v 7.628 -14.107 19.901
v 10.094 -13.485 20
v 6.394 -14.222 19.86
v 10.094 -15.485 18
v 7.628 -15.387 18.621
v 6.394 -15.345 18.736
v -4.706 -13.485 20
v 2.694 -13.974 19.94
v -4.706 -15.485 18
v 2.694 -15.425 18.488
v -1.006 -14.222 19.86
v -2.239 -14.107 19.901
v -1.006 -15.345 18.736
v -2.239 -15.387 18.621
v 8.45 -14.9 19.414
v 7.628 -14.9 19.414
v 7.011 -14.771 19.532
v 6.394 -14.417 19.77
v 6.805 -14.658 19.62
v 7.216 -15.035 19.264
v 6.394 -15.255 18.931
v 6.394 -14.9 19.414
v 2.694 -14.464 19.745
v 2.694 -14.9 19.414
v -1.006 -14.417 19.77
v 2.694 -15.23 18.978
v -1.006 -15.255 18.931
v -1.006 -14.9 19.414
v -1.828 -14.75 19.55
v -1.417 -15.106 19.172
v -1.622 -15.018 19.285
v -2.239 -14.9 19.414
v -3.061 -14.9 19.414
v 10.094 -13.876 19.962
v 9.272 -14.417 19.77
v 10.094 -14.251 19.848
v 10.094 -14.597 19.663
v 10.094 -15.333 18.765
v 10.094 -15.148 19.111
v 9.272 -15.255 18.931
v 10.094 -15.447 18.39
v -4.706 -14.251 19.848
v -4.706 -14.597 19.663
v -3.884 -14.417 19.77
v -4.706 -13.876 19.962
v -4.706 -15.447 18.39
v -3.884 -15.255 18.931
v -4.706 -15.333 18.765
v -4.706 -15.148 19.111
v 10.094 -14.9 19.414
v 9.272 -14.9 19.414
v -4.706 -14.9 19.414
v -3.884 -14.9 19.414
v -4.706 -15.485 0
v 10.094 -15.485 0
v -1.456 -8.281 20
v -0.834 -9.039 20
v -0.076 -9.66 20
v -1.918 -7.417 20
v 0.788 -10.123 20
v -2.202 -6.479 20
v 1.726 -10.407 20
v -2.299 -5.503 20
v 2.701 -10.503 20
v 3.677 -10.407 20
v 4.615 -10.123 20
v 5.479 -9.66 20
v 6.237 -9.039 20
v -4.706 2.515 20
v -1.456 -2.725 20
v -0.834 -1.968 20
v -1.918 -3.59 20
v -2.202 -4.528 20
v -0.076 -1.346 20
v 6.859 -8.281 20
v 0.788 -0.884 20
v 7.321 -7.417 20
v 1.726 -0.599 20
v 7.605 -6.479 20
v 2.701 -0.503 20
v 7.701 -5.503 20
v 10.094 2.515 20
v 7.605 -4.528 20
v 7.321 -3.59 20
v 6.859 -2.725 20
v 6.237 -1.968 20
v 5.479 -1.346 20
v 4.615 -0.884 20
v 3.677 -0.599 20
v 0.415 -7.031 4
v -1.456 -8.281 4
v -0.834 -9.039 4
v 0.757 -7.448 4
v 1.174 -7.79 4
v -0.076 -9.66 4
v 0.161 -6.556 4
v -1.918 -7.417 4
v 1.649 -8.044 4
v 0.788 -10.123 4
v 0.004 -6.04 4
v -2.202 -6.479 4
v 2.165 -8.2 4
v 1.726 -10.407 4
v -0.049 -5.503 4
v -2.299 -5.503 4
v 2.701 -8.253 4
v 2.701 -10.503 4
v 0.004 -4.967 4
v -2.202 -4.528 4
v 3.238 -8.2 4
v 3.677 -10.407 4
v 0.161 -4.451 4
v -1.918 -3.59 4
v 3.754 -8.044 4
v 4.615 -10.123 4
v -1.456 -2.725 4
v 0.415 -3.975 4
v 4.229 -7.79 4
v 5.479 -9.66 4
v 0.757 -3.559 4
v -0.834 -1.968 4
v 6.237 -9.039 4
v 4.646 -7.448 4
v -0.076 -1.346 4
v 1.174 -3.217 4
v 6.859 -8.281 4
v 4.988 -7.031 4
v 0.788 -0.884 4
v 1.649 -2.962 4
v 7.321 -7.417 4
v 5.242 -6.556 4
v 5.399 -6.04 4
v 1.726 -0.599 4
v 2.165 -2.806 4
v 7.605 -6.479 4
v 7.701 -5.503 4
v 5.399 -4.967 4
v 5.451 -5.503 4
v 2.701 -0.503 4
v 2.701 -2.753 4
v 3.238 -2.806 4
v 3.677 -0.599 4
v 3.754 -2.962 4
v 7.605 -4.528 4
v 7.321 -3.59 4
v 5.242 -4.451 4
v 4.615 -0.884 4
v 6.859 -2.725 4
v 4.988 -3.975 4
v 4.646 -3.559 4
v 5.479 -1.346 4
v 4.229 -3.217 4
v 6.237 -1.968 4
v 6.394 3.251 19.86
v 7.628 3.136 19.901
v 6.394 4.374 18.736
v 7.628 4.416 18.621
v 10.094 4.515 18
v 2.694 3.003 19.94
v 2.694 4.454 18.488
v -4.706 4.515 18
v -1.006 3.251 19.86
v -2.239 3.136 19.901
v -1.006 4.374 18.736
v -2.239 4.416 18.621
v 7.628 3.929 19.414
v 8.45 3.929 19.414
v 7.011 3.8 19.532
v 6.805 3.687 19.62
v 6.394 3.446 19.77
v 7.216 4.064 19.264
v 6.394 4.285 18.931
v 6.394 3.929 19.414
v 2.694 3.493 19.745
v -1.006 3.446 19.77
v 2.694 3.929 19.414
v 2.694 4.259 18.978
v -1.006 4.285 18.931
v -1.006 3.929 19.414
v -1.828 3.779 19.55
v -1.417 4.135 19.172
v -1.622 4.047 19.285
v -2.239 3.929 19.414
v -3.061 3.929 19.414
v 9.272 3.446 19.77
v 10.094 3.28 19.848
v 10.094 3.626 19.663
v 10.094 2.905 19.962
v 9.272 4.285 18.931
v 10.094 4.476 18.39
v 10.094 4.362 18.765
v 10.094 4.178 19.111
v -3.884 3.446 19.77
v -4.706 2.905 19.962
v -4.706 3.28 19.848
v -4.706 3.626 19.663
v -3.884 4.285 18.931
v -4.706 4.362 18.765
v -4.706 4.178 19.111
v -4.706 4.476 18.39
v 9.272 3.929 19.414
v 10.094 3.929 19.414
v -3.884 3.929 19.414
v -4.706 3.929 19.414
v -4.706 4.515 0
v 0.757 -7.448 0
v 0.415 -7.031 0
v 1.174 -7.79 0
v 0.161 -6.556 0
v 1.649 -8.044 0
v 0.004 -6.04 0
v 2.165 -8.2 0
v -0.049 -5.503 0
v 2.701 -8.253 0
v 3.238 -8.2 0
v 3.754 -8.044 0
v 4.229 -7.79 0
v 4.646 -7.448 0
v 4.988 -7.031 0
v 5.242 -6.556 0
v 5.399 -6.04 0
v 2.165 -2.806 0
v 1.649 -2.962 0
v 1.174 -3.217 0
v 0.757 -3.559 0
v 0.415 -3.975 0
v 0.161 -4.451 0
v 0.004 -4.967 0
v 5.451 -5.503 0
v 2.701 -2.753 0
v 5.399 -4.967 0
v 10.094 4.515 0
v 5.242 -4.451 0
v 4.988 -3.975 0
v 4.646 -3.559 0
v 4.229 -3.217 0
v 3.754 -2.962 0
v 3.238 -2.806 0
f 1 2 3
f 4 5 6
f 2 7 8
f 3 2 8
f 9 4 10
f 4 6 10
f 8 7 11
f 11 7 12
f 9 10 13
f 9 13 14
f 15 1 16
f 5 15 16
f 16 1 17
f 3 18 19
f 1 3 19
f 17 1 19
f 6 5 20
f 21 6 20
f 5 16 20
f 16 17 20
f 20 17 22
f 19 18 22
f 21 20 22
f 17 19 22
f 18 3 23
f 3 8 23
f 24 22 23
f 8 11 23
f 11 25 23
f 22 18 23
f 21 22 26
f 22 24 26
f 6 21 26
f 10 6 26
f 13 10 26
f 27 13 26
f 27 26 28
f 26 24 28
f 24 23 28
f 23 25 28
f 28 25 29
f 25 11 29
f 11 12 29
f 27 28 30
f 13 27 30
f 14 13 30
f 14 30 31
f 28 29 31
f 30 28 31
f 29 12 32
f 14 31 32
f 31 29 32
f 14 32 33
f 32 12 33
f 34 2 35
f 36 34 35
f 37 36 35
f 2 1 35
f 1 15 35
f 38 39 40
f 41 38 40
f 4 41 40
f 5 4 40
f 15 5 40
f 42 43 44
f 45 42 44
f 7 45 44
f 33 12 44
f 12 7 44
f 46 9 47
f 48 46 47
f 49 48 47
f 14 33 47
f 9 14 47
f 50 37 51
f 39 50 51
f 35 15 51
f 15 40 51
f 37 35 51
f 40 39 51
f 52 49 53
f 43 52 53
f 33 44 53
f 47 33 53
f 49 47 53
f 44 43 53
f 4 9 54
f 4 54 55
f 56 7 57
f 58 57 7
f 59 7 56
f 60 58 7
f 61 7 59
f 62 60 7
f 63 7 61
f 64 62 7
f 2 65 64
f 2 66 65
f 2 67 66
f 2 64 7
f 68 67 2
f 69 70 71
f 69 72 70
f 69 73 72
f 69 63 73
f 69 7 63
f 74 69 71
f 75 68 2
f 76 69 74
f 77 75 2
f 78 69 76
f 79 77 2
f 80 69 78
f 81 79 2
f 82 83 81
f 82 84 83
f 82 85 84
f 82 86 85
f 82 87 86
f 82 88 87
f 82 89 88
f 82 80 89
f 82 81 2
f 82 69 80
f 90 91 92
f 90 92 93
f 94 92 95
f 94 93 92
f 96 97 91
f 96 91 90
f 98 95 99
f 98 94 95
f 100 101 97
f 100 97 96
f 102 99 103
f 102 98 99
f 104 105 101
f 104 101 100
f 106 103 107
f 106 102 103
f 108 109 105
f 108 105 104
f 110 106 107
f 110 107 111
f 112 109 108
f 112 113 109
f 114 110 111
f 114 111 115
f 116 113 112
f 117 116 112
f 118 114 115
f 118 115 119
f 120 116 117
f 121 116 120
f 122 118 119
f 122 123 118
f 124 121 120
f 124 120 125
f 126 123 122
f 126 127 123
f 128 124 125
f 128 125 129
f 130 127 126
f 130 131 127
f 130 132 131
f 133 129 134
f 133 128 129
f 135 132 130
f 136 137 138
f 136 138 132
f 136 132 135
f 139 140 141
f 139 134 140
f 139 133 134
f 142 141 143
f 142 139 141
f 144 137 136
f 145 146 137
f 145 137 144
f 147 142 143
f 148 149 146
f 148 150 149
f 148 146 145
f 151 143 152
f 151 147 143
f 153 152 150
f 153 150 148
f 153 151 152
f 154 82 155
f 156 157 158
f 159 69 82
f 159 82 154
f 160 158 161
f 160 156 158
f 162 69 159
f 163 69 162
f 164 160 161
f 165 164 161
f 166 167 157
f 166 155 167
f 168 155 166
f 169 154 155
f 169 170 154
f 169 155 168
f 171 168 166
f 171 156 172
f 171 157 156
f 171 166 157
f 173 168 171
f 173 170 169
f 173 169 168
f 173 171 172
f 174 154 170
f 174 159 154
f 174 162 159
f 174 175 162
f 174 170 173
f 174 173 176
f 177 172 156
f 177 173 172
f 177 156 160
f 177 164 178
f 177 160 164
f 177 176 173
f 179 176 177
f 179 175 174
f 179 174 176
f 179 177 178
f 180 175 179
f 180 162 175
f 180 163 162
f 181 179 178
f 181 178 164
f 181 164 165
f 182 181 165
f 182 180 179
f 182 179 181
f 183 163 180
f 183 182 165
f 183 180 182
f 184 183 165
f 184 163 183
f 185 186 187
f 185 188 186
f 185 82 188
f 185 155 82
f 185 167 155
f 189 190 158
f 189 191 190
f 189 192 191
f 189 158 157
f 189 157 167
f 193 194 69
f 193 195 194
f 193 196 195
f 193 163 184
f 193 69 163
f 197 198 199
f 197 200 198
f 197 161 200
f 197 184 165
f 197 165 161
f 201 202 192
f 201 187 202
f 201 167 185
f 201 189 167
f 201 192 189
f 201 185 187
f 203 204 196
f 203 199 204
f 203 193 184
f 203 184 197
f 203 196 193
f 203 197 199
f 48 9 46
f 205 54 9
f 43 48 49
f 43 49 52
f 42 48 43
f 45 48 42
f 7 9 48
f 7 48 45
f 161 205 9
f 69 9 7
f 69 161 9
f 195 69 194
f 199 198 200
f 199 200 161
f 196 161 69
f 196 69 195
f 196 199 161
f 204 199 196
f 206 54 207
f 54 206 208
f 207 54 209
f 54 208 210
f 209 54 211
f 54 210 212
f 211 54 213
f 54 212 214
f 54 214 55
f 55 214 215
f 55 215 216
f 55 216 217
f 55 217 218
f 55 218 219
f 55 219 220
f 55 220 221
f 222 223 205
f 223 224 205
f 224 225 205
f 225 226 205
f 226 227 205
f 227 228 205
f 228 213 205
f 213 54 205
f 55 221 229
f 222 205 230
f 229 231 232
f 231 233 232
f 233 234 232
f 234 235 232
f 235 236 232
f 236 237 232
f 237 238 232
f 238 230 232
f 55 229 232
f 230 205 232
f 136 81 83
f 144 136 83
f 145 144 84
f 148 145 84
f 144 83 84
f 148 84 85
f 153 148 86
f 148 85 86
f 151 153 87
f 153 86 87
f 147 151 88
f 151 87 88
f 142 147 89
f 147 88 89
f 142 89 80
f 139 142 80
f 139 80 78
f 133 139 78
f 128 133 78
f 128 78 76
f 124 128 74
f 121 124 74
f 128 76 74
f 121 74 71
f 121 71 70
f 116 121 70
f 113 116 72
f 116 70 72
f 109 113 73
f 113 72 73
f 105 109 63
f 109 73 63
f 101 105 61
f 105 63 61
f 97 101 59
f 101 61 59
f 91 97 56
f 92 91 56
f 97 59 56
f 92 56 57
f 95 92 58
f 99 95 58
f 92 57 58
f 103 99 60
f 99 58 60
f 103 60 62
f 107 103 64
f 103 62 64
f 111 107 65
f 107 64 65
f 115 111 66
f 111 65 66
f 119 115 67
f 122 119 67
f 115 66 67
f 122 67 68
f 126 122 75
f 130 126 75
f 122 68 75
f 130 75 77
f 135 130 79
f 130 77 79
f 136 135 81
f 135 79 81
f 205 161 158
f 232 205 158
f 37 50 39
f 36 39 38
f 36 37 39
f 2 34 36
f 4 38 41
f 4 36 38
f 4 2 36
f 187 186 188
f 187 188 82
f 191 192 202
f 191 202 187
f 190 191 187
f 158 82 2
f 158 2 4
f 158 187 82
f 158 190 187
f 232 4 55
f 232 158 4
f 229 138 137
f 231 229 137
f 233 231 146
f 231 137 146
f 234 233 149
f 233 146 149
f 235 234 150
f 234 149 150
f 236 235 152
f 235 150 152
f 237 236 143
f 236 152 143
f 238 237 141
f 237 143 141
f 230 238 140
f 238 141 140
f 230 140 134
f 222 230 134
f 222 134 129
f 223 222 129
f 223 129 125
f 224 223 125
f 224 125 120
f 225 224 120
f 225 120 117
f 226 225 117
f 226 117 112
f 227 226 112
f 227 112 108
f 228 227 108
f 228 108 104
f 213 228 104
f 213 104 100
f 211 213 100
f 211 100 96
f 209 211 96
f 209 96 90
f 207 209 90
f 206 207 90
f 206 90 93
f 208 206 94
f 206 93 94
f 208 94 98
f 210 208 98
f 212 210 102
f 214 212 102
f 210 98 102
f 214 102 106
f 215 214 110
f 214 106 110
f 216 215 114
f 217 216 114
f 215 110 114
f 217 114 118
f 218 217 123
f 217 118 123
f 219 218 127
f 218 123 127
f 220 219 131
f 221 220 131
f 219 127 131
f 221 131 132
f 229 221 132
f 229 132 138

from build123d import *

# Parameters (mm, degrees)
SKETCH_1_W          = 15
SKETCH_1_H          = 20
EXTRUDE_1_DEPTH     = 20
SKETCH_5_R          = 5
SKETCH_5_R_2        = 2.75
CUT_EXTRUDE_1_DEPTH = 16
SKETCH_6_R          = 2.75
CUT_EXTRUDE_2_DEPTH = 28.271229432
FILLET_2_R          = 2
CUT_EXTRUDE_4_DEPTH = 0.1
CUT_EXTRUDE_5_DEPTH = 0.1


with BuildPart() as part:
    # 草图1 → 凸台-拉伸1 (new body)
    with BuildSketch(Plane.XY):
        with Locations((2.694174757, -5.485436893)):
            Rectangle(SKETCH_1_W, SKETCH_1_H)
    extrude(amount=EXTRUDE_1_DEPTH)

    # 草图5 → 切除-拉伸1 (cut)
    with BuildSketch(Plane.XY.offset(20)):
        with Locations((2.701438281, -5.503140696)):
            Circle(SKETCH_5_R)
        with Locations((2.701438281, -5.503140696)):
            Circle(SKETCH_5_R_2, mode=Mode.SUBTRACT)
    extrude(amount=-CUT_EXTRUDE_1_DEPTH, mode=Mode.SUBTRACT)

    # 草图6 → 切除-拉伸2 (cut, through all)
    with BuildSketch(Plane.XY.offset(20)):
        with Locations((2.701438281, -5.503140696)):
            Circle(SKETCH_6_R)
    extrude(amount=-CUT_EXTRUDE_2_DEPTH, mode=Mode.SUBTRACT)

    # 变化圆角2
    fillet_2_edges = [part.edges().sort_by_distance(p)[0] for p in [
        (2.694174757, -15.485436893, 20),
        (2.694174757, 4.514563107, 20),
    ]]
    fillet(fillet_2_edges, radius=FILLET_2_R)

    # 草图7 → 切除-拉伸4 (cut)
    with BuildSketch(Plane.ZY.offset(4.805825243)):
        with BuildLine():
            Line((0, -15.485436893), (18, -15.485436893))
            ThreePointArc((18, -15.485436893), (19.414213562, -14.899650456), (20, -13.485436893))
            Line((20, -13.485436893), (20, 2.514563107))
            ThreePointArc((20, 2.514563107), (19.414213562, 3.928776669), (18, 4.514563107))
            Line((18, 4.514563107), (0, 4.514563107))
            Line((0, 4.514563107), (0, -15.485436893))
        make_face()
    extrude(amount=-CUT_EXTRUDE_4_DEPTH, mode=Mode.SUBTRACT)

    # 草图8 → 切除-拉伸5 (cut)
    with BuildSketch(Plane(origin=(10.194174757, 0, 0), x_dir=(0, 0, -1), z_dir=(1, 0, 0))):
        with BuildLine():
            Line((-20, 2.514563107), (-20, -13.485436893))
            ThreePointArc((-20, -13.485436893), (-19.414213562, -14.899650456), (-18, -15.485436893))
            Line((-18, -15.485436893), (0, -15.485436893))
            Line((0, -15.485436893), (0, 4.514563107))
            Line((0, 4.514563107), (-18, 4.514563107))
            ThreePointArc((-18, 4.514563107), (-19.414213562, 3.928776669), (-20, 2.514563107))
        make_face()
    extrude(amount=-CUT_EXTRUDE_5_DEPTH, mode=Mode.SUBTRACT)


solid = part.part
